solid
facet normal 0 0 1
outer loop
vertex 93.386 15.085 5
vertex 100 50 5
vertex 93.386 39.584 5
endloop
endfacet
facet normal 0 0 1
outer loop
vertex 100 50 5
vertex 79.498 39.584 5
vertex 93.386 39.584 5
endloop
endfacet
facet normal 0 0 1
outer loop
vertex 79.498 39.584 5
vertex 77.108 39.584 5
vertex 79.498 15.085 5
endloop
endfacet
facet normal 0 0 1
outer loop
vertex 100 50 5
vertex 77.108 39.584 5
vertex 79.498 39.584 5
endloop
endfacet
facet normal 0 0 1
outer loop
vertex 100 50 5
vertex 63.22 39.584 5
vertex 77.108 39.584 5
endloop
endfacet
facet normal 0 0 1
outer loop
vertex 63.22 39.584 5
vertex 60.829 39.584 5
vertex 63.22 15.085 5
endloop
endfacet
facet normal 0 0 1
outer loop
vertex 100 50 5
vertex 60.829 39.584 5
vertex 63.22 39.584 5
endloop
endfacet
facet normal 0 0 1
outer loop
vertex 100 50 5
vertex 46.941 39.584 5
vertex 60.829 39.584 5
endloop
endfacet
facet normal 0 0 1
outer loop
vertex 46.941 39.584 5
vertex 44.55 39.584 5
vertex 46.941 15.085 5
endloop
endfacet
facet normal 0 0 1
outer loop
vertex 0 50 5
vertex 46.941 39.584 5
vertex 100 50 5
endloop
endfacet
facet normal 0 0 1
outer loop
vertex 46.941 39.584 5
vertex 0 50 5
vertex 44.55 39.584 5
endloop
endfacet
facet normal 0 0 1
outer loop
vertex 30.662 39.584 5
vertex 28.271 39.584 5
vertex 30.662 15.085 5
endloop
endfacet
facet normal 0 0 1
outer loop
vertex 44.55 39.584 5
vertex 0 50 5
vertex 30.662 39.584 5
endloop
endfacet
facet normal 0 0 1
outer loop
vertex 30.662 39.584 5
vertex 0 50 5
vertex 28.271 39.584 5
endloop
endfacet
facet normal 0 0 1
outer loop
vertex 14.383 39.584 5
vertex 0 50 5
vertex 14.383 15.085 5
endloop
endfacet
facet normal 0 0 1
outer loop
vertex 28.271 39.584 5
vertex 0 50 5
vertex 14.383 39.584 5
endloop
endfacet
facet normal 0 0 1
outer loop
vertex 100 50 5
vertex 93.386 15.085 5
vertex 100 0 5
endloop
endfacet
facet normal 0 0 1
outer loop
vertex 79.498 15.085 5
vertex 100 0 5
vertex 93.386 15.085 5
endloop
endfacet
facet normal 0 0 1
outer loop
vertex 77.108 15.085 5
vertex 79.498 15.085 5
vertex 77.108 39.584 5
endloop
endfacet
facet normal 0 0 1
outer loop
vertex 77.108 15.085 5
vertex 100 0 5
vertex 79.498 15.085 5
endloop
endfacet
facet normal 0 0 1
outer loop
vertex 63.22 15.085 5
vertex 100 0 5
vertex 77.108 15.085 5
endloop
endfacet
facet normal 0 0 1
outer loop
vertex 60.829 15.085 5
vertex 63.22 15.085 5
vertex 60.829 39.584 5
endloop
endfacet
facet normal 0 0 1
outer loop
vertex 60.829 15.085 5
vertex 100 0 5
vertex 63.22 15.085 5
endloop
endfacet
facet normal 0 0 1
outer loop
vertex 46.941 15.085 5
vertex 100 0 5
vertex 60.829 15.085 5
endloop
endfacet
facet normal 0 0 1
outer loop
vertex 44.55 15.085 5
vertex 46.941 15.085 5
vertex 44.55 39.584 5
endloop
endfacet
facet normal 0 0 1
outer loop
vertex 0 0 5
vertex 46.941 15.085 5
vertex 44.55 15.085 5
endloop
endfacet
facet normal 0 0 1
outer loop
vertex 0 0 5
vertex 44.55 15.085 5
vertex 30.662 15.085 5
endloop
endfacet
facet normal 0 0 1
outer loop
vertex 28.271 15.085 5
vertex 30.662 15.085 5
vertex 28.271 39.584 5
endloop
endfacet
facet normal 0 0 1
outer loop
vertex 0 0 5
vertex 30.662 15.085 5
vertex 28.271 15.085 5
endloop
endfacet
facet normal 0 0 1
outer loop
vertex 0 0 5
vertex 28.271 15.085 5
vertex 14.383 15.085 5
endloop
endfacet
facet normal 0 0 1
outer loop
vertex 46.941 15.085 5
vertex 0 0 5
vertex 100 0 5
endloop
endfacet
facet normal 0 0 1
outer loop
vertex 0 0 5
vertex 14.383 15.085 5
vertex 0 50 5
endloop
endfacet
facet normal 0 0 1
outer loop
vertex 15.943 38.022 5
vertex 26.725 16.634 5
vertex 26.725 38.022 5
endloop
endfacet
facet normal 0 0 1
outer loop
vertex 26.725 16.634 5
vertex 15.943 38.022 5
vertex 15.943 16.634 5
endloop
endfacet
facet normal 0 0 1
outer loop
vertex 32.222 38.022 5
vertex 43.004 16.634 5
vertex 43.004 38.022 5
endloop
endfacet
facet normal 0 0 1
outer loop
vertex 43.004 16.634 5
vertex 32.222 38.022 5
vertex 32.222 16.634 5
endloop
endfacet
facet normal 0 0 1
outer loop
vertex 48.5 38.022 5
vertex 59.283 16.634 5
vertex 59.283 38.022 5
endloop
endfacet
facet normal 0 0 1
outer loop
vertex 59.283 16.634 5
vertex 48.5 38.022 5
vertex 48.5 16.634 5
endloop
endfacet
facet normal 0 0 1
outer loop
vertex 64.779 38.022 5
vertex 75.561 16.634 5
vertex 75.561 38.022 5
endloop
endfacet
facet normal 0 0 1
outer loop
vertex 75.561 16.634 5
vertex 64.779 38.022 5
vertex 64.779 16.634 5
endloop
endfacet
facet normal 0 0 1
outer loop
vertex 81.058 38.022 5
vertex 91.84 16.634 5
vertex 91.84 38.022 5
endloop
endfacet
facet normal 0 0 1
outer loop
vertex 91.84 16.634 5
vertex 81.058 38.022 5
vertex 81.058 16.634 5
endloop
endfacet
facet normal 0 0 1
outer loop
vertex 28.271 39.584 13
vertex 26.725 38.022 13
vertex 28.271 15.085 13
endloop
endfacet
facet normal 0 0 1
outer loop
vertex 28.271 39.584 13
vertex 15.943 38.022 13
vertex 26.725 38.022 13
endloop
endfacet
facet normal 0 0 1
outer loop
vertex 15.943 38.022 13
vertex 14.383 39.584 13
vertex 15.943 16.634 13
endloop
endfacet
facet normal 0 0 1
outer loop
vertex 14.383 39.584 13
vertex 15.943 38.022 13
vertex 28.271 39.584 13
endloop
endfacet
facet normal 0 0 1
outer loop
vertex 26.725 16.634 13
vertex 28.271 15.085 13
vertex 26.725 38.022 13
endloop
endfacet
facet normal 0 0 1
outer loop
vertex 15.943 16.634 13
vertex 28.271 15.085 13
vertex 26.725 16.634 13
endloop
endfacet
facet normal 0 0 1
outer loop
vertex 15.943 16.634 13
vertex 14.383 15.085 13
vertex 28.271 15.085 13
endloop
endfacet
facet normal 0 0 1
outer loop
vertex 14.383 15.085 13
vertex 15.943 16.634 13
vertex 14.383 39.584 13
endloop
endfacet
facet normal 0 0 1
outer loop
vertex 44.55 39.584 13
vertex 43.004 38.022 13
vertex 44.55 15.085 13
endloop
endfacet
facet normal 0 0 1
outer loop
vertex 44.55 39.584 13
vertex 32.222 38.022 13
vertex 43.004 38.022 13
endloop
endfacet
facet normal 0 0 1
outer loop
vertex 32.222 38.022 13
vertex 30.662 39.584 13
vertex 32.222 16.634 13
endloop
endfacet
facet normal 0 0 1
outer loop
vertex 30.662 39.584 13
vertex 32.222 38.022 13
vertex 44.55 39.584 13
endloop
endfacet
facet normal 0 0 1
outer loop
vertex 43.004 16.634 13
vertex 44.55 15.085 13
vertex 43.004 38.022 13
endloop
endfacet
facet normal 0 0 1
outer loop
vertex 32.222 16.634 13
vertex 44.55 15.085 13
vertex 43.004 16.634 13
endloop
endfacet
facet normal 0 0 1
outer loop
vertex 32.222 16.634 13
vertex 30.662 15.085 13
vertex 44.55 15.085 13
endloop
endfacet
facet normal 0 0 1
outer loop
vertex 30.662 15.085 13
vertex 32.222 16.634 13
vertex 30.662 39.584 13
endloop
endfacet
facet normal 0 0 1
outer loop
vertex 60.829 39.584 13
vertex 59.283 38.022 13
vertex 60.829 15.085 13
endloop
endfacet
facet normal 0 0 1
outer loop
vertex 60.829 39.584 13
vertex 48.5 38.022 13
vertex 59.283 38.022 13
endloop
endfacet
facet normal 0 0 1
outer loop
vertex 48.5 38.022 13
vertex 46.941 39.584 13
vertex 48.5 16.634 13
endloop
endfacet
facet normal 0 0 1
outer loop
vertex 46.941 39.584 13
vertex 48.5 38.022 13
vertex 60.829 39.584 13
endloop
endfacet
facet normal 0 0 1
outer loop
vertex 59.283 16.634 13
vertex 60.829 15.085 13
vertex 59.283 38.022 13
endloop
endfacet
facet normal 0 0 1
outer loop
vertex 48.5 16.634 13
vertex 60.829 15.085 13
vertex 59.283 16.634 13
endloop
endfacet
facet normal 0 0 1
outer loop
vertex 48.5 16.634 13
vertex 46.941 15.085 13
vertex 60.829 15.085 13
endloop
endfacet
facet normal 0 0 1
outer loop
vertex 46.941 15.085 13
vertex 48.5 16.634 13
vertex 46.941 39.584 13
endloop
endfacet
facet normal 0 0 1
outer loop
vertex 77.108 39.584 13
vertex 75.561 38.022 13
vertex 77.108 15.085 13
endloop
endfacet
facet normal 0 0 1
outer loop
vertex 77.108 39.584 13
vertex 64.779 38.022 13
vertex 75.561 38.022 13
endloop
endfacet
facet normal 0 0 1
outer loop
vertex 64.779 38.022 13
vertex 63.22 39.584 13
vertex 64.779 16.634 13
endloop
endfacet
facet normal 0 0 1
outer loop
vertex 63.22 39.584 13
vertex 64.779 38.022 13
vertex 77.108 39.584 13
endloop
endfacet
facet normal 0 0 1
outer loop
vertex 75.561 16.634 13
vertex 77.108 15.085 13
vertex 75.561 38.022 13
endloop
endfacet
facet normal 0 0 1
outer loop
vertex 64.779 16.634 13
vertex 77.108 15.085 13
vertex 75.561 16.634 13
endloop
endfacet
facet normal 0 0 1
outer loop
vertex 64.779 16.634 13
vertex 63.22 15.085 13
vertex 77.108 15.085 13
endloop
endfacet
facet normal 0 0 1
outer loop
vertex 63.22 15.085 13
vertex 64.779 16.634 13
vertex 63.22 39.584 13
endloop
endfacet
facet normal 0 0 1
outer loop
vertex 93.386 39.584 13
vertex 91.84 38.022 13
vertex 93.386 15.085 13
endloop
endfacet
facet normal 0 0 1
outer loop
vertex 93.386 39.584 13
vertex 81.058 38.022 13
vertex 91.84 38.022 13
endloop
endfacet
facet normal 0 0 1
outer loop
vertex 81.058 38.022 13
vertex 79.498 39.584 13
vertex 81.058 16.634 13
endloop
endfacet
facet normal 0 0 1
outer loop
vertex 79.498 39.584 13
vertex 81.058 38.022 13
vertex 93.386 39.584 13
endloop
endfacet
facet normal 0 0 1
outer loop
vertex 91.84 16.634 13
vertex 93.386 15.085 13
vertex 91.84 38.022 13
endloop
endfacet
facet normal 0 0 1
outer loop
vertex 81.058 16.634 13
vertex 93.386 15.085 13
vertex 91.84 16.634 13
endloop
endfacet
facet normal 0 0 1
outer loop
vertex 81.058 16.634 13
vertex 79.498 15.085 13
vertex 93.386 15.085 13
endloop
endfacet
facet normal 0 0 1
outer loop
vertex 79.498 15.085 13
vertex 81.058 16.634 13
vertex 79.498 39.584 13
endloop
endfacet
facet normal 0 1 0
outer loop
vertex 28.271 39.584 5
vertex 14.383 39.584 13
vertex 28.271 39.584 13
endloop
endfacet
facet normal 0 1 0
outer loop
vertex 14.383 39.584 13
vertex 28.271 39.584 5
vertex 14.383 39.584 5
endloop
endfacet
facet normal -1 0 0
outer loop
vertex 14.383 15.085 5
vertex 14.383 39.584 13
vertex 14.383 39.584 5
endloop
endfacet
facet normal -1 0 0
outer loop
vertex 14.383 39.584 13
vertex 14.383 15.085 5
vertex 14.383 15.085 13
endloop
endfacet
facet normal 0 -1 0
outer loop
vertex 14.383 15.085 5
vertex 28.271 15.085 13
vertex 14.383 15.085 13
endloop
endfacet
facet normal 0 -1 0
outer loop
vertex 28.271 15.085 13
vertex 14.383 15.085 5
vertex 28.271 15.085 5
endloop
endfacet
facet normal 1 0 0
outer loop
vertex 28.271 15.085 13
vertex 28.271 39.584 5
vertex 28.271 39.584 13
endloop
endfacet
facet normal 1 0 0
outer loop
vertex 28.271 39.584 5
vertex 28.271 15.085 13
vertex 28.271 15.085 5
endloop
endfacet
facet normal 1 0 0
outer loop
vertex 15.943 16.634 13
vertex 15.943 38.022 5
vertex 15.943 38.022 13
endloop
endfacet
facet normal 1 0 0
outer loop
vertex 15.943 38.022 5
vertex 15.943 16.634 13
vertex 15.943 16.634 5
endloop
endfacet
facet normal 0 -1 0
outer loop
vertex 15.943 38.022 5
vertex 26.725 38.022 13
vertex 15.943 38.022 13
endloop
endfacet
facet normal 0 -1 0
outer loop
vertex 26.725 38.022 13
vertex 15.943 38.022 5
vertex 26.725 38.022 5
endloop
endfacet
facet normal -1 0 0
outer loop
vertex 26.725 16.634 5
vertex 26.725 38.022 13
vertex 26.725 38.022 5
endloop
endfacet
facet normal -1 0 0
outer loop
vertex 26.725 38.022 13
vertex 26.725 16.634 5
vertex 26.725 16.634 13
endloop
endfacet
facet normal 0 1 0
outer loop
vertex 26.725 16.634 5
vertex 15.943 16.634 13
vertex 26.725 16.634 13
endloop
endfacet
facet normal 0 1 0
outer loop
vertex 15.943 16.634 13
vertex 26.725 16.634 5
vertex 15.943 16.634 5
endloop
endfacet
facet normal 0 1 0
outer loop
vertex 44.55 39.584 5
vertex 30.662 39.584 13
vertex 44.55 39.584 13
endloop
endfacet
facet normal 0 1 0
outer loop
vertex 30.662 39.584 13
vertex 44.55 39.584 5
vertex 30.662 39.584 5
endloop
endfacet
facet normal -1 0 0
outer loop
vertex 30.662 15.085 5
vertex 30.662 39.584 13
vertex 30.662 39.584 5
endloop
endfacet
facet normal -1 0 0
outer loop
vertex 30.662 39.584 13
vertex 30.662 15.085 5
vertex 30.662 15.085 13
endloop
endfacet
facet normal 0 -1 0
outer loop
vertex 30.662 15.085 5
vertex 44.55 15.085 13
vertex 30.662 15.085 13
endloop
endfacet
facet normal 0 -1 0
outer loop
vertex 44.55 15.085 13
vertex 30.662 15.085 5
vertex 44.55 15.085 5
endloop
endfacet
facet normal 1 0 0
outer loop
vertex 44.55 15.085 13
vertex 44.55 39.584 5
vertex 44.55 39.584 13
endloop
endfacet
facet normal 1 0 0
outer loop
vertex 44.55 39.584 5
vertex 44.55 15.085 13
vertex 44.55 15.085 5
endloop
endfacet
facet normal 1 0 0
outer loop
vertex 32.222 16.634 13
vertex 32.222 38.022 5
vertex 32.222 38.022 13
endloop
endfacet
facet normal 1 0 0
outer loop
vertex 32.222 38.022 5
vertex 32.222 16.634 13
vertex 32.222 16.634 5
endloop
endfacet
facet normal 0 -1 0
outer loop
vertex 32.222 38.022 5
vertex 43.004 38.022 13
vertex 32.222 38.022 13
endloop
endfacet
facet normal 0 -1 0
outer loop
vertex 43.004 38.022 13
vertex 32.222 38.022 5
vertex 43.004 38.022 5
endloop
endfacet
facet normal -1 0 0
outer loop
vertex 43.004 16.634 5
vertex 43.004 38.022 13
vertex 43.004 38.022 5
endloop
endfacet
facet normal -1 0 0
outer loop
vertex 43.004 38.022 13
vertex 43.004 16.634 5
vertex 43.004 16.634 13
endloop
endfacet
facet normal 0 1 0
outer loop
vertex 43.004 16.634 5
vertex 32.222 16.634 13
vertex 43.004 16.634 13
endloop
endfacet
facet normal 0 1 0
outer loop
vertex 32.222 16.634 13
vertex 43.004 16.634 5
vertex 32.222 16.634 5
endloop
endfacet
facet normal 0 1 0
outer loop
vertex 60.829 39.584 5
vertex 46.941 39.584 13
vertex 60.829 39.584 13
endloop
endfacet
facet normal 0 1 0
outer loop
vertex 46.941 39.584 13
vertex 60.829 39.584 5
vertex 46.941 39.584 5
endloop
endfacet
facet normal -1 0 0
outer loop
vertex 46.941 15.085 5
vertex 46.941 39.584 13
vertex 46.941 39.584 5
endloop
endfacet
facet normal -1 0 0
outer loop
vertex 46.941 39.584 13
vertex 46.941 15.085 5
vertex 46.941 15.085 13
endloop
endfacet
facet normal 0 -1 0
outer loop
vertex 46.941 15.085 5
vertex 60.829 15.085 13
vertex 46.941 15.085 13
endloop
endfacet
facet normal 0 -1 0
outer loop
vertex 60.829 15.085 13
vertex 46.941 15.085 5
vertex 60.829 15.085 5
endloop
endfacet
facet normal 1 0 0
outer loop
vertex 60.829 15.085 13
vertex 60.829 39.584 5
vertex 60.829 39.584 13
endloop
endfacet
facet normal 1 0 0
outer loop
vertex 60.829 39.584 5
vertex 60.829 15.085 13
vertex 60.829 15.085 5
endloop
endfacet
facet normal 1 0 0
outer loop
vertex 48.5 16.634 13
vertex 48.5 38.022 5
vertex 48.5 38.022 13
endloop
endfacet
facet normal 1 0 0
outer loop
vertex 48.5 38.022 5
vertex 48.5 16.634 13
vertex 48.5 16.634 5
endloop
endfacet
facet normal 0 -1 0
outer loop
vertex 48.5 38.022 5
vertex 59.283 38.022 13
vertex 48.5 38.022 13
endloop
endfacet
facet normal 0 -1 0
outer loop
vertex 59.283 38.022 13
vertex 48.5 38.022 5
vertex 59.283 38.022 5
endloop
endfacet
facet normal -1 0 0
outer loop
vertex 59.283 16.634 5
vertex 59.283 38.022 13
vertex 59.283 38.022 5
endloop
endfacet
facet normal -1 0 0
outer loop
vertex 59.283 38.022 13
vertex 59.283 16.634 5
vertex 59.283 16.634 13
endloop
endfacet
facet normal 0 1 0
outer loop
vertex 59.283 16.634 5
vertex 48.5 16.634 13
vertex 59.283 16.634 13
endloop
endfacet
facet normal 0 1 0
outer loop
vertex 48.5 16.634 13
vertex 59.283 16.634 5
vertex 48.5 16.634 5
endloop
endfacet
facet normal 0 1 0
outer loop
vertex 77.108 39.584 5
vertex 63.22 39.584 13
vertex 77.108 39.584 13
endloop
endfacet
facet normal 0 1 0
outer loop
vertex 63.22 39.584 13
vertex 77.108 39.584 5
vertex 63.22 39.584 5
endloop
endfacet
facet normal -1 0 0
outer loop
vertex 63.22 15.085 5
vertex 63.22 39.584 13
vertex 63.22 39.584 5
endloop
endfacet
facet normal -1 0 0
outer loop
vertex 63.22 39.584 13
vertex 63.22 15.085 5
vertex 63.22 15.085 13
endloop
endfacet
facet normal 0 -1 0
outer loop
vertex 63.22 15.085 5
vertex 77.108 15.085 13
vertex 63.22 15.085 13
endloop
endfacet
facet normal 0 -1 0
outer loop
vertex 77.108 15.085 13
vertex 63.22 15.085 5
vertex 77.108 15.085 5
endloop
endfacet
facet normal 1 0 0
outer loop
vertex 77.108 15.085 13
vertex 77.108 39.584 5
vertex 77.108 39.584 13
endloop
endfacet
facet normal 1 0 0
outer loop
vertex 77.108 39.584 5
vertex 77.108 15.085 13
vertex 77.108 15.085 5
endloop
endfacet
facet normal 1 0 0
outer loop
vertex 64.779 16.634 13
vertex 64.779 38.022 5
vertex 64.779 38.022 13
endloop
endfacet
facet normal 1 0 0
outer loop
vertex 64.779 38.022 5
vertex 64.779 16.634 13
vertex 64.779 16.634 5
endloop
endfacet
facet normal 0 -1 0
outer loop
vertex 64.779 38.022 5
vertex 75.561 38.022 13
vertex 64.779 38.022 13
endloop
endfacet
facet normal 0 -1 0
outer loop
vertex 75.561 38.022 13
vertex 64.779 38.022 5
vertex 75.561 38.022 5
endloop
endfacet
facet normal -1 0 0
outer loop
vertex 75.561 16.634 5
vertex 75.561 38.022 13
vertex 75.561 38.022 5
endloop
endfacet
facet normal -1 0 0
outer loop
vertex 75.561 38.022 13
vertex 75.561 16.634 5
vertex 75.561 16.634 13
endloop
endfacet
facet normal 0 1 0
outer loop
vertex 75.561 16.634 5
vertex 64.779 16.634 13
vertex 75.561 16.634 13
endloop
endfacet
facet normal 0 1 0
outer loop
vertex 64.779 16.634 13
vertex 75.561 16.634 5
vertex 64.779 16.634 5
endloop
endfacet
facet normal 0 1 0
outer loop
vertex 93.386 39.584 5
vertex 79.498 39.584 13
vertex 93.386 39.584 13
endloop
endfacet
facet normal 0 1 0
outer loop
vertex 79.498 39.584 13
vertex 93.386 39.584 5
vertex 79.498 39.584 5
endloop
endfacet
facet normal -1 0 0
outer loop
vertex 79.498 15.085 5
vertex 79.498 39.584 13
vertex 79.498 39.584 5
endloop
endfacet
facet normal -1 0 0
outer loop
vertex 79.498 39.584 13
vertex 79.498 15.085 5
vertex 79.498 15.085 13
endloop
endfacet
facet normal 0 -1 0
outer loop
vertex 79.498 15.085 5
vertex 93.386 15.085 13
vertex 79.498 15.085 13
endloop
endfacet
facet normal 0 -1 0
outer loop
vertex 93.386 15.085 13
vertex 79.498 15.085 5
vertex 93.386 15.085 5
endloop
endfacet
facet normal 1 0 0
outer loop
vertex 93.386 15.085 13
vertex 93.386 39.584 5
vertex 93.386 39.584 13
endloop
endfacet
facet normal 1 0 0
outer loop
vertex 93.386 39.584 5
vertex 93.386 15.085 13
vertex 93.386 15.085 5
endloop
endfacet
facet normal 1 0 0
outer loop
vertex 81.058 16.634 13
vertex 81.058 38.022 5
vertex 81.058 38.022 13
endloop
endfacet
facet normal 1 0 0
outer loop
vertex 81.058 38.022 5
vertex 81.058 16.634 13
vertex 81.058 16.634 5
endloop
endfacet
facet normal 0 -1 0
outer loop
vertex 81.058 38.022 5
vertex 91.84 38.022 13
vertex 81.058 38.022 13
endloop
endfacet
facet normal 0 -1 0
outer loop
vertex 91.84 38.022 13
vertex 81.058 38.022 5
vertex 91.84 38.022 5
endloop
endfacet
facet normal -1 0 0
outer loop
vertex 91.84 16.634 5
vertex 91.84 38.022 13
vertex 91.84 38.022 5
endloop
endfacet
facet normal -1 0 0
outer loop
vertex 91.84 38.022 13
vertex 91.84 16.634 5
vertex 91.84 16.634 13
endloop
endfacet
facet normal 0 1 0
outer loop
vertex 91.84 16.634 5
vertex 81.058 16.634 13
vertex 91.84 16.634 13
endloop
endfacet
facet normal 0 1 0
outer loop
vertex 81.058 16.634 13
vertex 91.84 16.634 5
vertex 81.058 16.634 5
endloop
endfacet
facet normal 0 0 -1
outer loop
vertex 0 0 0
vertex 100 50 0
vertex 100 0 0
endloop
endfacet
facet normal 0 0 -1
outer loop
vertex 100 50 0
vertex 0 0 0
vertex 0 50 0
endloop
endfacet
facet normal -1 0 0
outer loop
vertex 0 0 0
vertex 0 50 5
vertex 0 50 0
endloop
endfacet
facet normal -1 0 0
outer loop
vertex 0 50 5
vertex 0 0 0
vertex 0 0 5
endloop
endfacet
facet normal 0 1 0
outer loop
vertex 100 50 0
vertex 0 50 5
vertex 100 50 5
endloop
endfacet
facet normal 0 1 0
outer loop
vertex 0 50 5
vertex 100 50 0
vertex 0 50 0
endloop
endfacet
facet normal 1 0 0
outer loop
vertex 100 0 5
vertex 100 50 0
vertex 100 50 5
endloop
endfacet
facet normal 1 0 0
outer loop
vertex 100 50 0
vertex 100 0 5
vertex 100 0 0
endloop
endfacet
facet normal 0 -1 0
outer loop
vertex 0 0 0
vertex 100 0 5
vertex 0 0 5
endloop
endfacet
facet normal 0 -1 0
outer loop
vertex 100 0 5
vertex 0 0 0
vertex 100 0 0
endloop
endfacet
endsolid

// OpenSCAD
$fn=100;
translate([13,20,5])
    color([1,0,0])
        scale([2,2,2])
            linear_extrude(height=4)
                text("\u0BA4\u0BAE\u0BBF\u0BB4\u0BCD",font="Meera Inimai:style=Regular");

linear_extrude(height=5)
    square([100,50],0);
